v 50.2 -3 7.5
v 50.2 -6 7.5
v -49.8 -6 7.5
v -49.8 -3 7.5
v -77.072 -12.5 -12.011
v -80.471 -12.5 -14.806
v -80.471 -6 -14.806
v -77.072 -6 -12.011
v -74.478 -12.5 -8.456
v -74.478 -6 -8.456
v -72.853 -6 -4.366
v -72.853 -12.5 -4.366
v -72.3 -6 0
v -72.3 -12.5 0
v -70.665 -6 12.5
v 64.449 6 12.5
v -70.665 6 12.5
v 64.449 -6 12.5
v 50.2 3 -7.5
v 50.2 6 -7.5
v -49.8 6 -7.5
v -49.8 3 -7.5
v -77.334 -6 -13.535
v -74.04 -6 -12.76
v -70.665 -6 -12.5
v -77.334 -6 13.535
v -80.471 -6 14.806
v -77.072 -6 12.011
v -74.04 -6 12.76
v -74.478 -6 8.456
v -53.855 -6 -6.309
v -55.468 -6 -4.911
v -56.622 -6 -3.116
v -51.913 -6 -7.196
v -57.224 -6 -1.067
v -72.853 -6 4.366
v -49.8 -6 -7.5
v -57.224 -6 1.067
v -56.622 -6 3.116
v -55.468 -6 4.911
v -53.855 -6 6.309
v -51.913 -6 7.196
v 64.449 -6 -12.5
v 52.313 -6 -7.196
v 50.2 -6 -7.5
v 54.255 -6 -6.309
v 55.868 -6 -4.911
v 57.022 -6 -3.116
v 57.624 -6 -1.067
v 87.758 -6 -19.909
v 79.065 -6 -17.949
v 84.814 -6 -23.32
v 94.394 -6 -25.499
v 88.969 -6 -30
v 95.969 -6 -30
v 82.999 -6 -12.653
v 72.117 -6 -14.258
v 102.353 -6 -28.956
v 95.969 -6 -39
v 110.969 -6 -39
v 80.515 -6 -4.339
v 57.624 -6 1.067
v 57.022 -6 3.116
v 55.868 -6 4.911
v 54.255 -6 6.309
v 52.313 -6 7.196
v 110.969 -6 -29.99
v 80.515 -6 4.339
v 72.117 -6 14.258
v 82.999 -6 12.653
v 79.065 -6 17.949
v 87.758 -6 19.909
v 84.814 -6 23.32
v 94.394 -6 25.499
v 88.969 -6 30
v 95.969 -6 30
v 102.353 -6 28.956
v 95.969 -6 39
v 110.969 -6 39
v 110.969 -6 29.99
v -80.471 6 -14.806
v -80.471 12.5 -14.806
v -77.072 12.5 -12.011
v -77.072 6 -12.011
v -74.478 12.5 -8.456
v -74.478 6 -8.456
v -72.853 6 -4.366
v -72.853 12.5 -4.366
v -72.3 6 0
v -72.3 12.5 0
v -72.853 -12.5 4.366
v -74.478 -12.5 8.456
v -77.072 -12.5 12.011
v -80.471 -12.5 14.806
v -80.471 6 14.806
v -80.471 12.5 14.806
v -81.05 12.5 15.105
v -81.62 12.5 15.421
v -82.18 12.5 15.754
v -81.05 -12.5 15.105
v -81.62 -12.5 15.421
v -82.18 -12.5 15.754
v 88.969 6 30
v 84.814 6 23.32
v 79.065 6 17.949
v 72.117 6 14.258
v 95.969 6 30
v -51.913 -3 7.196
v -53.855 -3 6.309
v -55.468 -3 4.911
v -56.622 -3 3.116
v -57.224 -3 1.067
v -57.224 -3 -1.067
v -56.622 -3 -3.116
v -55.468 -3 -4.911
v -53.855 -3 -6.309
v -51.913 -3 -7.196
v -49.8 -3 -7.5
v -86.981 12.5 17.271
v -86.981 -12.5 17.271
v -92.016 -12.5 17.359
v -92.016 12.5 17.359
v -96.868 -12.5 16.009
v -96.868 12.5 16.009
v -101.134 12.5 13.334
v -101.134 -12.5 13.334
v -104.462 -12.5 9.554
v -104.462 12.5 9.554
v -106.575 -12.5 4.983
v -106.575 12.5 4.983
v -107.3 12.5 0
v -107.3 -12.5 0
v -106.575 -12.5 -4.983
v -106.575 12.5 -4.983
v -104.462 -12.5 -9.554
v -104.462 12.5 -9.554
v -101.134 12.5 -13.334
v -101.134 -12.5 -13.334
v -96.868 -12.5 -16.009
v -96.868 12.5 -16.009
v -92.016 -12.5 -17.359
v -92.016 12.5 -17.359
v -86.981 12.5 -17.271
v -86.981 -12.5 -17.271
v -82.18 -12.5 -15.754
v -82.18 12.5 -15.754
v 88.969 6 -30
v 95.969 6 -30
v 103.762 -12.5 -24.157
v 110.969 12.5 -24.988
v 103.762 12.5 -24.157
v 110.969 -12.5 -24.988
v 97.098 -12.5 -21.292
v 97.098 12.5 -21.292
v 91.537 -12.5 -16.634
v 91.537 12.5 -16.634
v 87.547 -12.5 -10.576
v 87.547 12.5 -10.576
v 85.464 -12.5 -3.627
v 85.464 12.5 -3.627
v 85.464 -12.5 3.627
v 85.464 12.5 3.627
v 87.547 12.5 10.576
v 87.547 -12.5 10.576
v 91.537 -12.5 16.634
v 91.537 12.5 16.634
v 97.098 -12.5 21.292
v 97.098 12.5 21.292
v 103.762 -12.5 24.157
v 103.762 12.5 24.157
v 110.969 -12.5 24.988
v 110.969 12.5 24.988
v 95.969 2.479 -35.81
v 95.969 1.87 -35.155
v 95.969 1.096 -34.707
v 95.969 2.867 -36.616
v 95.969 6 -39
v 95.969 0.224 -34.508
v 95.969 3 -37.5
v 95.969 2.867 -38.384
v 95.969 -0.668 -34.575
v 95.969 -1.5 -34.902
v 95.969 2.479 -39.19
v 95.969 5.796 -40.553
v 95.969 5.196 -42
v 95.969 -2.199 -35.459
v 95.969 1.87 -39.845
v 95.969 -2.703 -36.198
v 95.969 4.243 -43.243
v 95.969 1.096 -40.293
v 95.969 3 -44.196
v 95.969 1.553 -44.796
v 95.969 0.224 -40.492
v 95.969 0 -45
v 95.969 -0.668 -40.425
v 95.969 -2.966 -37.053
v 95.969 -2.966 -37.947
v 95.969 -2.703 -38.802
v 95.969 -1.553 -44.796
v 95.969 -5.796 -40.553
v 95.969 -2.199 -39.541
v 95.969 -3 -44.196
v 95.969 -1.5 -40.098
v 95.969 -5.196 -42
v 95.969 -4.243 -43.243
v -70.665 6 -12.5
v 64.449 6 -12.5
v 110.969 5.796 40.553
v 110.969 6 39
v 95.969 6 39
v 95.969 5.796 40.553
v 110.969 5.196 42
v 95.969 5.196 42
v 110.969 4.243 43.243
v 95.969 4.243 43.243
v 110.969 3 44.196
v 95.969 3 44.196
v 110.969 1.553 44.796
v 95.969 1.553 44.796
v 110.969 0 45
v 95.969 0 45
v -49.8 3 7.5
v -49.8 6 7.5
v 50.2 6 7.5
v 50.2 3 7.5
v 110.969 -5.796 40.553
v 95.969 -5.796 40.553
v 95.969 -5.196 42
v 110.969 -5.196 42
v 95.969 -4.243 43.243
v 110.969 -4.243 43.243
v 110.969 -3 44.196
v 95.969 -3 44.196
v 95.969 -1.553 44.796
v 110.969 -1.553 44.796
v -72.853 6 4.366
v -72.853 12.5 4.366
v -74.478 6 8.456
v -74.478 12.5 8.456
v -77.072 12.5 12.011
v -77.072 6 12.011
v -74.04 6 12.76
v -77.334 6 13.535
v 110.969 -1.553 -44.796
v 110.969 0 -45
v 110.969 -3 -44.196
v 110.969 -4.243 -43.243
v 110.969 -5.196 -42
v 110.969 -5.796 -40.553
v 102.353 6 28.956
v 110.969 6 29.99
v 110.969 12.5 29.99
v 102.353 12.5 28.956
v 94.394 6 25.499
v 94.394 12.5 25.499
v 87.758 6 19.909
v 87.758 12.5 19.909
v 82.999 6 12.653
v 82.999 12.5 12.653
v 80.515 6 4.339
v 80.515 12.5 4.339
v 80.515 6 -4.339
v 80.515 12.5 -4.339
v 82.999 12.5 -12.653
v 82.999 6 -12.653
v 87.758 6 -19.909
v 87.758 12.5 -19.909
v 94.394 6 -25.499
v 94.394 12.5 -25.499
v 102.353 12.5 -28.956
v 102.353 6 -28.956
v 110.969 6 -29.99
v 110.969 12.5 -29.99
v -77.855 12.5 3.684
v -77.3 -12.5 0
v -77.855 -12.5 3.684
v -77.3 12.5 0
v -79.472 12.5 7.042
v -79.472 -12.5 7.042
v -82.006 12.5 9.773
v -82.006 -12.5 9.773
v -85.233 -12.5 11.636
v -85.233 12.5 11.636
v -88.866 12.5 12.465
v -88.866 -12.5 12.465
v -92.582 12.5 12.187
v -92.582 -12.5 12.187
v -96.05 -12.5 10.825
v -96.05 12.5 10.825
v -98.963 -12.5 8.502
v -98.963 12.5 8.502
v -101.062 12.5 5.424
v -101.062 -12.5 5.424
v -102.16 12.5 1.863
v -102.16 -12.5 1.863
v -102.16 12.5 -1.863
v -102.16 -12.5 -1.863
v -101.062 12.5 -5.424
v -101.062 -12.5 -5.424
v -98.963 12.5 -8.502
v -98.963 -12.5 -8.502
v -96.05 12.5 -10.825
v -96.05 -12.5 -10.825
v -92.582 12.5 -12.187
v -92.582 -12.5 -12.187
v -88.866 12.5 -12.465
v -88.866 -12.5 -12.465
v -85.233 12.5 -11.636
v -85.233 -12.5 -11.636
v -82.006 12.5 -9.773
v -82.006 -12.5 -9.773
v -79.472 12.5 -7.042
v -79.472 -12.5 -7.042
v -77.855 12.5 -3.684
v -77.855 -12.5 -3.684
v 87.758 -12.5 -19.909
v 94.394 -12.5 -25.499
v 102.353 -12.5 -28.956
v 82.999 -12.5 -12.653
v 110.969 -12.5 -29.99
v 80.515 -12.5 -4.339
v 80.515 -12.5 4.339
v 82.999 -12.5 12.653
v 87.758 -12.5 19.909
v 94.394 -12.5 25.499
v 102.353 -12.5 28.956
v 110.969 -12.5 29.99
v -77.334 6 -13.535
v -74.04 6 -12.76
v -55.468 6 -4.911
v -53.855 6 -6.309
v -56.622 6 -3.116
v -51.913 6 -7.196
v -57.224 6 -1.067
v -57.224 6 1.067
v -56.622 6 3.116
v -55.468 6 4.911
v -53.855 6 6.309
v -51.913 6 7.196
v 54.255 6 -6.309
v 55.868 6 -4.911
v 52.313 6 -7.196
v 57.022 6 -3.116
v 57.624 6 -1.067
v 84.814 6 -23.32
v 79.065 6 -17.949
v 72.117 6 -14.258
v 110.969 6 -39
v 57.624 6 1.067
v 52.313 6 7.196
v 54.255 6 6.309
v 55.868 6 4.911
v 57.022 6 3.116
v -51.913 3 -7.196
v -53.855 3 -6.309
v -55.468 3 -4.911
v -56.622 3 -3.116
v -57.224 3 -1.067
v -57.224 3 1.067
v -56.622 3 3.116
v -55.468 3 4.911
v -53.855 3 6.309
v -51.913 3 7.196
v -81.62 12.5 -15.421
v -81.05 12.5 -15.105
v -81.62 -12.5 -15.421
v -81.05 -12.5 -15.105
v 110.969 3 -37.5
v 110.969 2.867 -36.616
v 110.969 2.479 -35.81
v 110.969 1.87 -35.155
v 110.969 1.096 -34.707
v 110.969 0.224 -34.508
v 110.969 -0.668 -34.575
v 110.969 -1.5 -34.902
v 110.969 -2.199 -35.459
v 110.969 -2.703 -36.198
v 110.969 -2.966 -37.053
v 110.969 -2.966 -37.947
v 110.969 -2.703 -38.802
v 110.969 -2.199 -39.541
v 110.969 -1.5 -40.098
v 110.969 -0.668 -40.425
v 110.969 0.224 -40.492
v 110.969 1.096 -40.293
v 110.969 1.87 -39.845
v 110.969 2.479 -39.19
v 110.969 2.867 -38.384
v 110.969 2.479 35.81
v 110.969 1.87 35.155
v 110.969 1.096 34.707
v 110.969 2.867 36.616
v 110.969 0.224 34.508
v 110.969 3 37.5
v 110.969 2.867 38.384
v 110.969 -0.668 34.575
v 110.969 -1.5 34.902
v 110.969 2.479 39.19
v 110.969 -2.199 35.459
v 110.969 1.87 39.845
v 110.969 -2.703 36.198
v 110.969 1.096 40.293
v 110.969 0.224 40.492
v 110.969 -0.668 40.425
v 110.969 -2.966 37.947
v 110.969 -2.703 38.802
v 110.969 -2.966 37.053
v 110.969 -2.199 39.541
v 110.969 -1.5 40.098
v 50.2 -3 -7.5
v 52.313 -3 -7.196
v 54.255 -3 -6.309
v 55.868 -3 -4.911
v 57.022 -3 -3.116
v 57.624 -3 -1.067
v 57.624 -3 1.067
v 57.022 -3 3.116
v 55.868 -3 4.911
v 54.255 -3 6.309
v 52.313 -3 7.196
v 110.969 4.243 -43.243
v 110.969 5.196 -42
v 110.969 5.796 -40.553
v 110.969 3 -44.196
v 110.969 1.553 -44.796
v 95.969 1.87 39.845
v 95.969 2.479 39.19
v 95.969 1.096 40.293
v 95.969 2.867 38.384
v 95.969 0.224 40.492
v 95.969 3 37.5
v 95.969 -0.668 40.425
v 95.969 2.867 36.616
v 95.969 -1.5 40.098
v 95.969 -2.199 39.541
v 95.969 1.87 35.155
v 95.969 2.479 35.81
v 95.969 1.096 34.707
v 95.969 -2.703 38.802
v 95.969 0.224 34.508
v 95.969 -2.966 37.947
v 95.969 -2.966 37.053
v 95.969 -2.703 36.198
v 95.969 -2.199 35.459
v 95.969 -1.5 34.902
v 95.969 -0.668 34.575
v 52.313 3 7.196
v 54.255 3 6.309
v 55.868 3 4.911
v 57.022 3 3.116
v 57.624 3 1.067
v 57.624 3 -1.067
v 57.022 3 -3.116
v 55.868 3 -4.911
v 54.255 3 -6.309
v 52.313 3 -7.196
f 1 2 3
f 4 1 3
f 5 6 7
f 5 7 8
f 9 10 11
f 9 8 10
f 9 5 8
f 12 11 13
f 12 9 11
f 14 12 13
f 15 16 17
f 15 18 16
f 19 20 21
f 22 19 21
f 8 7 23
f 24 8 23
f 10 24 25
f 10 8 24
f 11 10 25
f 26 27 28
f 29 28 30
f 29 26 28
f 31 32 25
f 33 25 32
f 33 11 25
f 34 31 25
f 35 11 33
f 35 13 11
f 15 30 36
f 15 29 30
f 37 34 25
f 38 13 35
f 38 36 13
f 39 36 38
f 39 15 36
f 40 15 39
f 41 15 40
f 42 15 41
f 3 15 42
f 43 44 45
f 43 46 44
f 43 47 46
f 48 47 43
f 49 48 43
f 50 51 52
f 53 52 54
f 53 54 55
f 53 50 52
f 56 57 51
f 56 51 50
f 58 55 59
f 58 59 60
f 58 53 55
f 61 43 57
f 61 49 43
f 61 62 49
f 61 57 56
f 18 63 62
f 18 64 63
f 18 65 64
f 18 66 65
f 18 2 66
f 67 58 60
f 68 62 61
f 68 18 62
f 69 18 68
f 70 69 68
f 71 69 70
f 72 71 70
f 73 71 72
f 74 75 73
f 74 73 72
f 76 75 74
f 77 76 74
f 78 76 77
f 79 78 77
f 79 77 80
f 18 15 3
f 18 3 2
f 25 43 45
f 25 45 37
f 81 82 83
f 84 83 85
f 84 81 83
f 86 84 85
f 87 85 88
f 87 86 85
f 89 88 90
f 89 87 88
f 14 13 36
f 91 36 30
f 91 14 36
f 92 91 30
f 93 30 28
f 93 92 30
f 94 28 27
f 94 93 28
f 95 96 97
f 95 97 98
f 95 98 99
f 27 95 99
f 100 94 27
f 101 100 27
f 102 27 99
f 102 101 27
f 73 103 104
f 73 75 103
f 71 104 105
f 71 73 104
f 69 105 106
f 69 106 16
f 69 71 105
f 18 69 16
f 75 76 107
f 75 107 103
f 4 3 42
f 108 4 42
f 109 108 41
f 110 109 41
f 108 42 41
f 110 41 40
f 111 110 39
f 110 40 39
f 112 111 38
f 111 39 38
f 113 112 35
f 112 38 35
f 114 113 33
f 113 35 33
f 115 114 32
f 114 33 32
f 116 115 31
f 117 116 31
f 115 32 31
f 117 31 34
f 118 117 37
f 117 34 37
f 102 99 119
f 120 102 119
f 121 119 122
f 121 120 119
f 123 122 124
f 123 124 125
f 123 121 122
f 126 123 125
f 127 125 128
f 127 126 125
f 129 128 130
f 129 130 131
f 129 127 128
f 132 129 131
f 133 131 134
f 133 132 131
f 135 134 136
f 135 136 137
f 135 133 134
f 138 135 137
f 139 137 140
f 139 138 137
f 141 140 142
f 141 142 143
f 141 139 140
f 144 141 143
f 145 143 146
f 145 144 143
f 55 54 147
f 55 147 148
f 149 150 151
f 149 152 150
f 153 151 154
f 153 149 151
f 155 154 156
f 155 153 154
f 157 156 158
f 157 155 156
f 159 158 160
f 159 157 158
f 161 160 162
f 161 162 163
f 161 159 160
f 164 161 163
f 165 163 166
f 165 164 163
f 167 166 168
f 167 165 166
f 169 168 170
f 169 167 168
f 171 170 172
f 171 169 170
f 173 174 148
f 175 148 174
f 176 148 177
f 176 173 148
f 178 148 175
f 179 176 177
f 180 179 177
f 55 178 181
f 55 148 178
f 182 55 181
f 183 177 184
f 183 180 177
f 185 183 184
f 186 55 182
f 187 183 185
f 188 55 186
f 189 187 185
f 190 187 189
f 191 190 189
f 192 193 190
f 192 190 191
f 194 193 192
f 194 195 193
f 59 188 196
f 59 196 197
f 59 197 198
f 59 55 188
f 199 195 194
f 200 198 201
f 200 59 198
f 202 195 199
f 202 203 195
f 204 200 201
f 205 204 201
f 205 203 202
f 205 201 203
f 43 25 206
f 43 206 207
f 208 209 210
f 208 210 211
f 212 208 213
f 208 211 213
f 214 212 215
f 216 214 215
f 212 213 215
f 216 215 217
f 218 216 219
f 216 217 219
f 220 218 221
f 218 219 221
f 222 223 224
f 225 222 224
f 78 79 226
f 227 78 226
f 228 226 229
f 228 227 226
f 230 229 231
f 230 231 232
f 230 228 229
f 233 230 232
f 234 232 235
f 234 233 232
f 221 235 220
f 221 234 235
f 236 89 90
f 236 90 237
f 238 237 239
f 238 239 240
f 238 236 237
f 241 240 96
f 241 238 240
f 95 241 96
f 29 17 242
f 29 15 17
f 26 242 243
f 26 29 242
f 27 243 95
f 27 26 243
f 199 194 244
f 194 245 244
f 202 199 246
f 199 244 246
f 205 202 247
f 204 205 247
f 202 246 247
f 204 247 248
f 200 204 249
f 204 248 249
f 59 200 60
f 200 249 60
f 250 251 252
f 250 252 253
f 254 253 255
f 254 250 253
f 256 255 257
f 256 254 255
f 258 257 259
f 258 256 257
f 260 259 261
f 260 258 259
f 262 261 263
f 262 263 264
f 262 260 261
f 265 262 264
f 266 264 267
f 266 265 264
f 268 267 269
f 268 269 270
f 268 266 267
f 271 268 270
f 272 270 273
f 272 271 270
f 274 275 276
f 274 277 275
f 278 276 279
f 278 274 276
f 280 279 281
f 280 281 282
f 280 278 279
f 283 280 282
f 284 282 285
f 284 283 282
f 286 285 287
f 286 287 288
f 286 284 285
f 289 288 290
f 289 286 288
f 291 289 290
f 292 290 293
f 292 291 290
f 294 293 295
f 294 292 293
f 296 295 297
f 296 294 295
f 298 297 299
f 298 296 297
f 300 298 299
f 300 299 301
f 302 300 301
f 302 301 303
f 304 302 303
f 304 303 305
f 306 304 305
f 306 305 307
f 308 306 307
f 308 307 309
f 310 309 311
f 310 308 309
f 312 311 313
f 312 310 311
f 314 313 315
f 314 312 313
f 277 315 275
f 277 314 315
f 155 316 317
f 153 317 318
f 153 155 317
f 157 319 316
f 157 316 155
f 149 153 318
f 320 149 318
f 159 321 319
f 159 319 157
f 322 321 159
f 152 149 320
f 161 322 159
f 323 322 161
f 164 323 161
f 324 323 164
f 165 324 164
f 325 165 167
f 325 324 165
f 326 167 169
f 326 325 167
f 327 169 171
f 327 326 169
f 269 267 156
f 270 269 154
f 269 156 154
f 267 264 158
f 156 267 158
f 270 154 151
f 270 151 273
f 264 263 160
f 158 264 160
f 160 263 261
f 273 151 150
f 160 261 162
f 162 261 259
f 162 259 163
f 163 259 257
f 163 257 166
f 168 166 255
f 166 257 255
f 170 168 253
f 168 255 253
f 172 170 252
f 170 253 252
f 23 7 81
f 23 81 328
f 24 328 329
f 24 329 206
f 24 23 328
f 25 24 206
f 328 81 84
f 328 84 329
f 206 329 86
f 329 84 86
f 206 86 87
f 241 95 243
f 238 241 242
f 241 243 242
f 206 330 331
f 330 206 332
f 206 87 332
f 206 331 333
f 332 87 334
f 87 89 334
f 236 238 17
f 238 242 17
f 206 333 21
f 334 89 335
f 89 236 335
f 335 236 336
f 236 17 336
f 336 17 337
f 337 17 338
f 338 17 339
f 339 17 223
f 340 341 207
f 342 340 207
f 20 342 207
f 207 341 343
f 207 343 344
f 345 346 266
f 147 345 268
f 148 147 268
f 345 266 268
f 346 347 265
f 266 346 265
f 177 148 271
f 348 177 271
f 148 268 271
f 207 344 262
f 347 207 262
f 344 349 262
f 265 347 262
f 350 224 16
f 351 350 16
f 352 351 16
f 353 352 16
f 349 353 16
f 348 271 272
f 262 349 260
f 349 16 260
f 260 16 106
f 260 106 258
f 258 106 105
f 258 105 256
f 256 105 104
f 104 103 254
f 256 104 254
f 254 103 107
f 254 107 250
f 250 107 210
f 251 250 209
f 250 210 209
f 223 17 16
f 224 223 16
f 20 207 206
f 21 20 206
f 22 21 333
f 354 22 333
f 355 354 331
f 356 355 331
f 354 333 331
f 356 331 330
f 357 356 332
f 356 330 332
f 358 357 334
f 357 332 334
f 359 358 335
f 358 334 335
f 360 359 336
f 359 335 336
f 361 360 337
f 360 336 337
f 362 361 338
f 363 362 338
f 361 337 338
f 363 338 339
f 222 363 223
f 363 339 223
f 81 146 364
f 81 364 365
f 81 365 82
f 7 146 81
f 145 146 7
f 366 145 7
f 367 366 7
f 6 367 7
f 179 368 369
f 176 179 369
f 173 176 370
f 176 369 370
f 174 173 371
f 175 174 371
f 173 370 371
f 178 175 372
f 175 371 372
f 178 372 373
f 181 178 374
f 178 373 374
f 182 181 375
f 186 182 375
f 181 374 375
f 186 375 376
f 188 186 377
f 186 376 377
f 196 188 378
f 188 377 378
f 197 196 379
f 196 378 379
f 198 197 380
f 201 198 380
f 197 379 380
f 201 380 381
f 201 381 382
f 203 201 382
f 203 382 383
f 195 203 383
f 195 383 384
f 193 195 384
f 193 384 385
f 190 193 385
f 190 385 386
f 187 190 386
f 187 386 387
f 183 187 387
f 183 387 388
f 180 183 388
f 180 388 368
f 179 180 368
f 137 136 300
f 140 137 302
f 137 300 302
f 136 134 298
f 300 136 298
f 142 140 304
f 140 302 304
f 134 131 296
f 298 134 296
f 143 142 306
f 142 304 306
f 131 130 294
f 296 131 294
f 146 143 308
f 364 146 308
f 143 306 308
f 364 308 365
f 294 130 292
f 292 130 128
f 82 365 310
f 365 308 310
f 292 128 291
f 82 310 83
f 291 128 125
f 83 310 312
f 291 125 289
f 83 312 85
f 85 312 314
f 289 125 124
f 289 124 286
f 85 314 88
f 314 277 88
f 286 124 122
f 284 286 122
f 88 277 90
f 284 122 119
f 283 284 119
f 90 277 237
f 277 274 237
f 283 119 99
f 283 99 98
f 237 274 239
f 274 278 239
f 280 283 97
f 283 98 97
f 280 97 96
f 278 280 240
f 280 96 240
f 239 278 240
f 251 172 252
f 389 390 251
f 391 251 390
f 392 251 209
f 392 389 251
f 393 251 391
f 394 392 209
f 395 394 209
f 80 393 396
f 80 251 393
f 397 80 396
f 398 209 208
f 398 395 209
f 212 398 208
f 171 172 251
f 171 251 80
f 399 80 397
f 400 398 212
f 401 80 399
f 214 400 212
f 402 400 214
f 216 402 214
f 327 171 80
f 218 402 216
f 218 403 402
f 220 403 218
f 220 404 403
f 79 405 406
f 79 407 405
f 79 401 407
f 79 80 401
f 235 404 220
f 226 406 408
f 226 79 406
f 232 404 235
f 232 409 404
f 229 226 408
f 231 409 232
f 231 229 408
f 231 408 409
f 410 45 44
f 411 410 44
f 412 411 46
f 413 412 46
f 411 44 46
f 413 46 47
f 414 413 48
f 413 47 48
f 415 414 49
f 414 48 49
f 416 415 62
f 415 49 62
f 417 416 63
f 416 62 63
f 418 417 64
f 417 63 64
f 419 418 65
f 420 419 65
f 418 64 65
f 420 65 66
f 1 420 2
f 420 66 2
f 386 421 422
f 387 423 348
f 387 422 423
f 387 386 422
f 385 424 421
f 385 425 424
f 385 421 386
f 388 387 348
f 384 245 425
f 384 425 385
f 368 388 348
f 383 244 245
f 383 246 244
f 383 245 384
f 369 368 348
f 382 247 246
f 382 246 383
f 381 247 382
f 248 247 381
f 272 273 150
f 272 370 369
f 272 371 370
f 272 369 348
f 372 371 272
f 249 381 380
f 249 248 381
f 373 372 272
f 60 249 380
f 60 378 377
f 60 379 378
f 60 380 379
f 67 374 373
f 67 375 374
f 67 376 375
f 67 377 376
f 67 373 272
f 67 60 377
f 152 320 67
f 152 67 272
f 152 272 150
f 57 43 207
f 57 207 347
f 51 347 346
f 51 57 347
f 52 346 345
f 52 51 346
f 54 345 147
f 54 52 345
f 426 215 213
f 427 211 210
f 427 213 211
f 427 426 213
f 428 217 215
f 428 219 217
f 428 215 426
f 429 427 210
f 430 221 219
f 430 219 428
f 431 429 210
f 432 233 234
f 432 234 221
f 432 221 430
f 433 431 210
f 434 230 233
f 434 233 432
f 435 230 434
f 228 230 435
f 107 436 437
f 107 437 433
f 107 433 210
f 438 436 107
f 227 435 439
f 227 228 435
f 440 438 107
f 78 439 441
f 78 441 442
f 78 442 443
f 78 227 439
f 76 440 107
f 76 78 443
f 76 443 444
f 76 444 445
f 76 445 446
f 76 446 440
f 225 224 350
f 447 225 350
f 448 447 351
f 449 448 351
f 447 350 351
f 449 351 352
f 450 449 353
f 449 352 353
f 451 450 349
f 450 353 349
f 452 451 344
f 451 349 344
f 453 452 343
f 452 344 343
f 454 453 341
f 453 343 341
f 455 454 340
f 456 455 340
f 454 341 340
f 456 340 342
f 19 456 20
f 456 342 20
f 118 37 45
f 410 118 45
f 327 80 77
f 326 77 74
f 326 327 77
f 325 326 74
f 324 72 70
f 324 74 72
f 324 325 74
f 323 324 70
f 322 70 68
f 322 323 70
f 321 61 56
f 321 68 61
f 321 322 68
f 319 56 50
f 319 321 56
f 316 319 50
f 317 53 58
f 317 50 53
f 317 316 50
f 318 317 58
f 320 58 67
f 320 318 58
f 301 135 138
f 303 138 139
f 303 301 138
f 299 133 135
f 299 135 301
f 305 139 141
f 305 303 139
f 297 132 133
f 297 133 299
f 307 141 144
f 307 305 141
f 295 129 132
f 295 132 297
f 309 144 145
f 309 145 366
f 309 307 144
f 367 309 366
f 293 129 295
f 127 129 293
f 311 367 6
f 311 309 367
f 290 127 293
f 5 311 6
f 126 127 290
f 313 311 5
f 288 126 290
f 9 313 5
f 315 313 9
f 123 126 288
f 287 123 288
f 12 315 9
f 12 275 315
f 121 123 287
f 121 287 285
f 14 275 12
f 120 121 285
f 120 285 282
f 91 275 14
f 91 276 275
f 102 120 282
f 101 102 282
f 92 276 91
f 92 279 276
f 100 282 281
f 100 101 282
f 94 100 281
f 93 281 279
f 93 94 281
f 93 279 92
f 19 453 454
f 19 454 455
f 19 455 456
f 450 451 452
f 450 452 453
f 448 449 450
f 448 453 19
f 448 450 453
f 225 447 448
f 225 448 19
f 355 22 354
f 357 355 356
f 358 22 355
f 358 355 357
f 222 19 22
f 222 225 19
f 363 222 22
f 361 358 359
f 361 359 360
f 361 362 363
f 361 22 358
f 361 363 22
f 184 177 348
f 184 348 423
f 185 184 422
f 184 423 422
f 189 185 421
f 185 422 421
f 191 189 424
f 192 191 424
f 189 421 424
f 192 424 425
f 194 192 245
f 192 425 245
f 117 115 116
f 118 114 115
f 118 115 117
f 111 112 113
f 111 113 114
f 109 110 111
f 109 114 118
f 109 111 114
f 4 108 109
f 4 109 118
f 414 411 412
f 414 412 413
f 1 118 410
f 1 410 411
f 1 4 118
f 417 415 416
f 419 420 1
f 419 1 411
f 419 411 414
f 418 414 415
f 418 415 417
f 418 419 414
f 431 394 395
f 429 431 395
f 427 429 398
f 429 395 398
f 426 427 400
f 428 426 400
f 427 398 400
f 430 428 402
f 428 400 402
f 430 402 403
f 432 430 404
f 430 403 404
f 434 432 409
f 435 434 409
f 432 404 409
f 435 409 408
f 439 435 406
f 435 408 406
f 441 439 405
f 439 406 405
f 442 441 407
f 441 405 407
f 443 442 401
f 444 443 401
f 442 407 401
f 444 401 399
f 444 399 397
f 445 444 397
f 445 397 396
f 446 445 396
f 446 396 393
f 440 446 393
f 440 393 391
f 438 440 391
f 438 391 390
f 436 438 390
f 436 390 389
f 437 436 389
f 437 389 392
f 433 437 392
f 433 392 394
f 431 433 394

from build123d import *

# Parameters (mm, degrees)
F1_DEPTH  = 12.5
F0_R      = 12.5
F2_DEPTH  = 6
F3_R      = 5.99999
F4_R      = 5.99999
F6_DEPTH  = 3
F8_DEPTH  = 3
F9_R      = 3
F10_DEPTH = 218.2697359261


# Not quite as in the source:
# - a fillet or chamfer is up to 0.001 mm smaller than in the source, because OpenCascade refuses the exact size


with BuildPart() as f1:
    # F0 (on Front) → F1 (new body, symmetric)
    with BuildSketch(Plane.XZ):
        with BuildLine():
            Line((110.9687169417, 24.9881781063), (110.9687169417, 29.9901491338))
            ThreePointArc((110.9687169417, 29.9901491338), (80.1999810155, 2.02996e-05), (110.9686763555, -29.9901501743))
            Line((110.9686763555, -29.9901501743), (110.9686763555, -24.988179355))
            ThreePointArc((110.9686763555, -24.988179355), (85.1999810155, 2.03026e-05), (110.9687169417, 24.9881781063))
        make_face()
    extrude(amount=F1_DEPTH, both=True)



with BuildPart() as f1b:
    # F0 (on Front) → F1, piece 2 (new body, symmetric)
    with BuildSketch(Plane.XZ):
        with BuildLine():
            ThreePointArc((-80.4711318513, 14.8061428082), (-81.3358966232, 15.2609531347), (-82.1796143085, 15.7537117078))
            ThreePointArc((-82.1796143085, 15.7537117078), (-107.3000189845, 0), (-82.1796143085, -15.7537117078))
            ThreePointArc((-82.1796143085, -15.7537117078), (-81.3358966232, -15.2609531347), (-80.4711318513, -14.8061428082))
            ThreePointArc((-80.4711318513, -14.8061428082), (-74.4783753907, -8.455603916), (-72.3000189845, 0))
            ThreePointArc((-72.3000189845, 0), (-74.4783753907, 8.455603916), (-80.4711318513, 14.8061428082))
        make_face()
        with Locations((-89.8000189845, 0)):
            Circle(F0_R, mode=Mode.SUBTRACT)
    extrude(amount=F1_DEPTH, both=True)


with BuildPart() as f1_1:
    add(f1.part)

    add(f1b.part)  # F2 merges F1b
    # F0 (on Front) → F2 (join, symmetric)
    with BuildSketch(Plane.XZ):
        with BuildLine():
            ThreePointArc((-70.6654197961, 12.5), (-75.702042761, 13.0842948024), (-80.4711318513, 14.8061428082))
            ThreePointArc((-80.4711318513, 14.8061428082), (-74.4783753907, 8.455603916), (-72.3000189845, 0))
            ThreePointArc((-72.3000189845, 0), (-74.4783753907, -8.455603916), (-80.4711318513, -14.8061428082))
            ThreePointArc((-80.4711318513, -14.8061428082), (-75.702042761, -13.0842948024), (-70.6654197961, -12.5))
            Line((-70.6654197961, -12.5), (64.4492452955, -12.5))
            ThreePointArc((64.4492452955, -12.5), (79.0647132666, -17.9493308815), (88.9686763555, -30))
            Line((88.9686763555, -30), (95.9686763555, -30))
            Line((95.9686763555, -30), (95.9686763555, -45))
            Line((95.9686763555, -45), (110.9686763555, -45))
            Line((110.9686763555, -45), (110.9686763555, -29.9901501743))
            ThreePointArc((110.9686763555, -29.9901501743), (80.1999810155, 2.02996e-05), (110.9687169417, 29.9901491338))
            Line((110.9687169417, 29.9901491338), (110.9687169417, 45))
            Line((110.9687169417, 45), (95.9687169417, 44.9999957531))
            Line((95.9687169417, 44.9999957531), (95.9687169417, 29.9999957531))
            Line((95.9687169417, 29.9999957531), (88.9687169417, 29.9999957531))
            ThreePointArc((88.9687169417, 29.9999957531), (79.0647357521, 17.9493194217), (64.4492452955, 12.5))
            Line((64.4492452955, 12.5), (-70.6654197961, 12.5))
        make_face()
    extrude(amount=F2_DEPTH, both=True)

    # F3 (radius 6 in the source; OpenCascade refuses exactly that, so slightly less here)
    f3_edges = [f1_1.edges().sort_by_distance(p)[0] for p in [
        (103.468717, -6, 44.999998),
        (103.468717, 6, 44.999998),
    ]]
    fillet(f3_edges, radius=F3_R)

    # F4 (radius 6 in the source; OpenCascade refuses exactly that, so slightly less here)
    f4_edges = [f1_1.edges().sort_by_distance(p)[0] for p in [
        (103.468676, -6, -45),
        (103.468676, 6, -45),
    ]]
    fillet(f4_edges, radius=F4_R)

    # F5 (on face) → F6 (cut)
    with BuildSketch(Plane.XZ.offset(6)):
        with BuildLine():
            Line((50.1999810155, 7.5), (-49.8000189845, 7.5))
            ThreePointArc((-49.8000189845, 7.5), (-57.3000189845, 0), (-49.8000189845, -7.5))
            Line((-49.8000189845, -7.5), (50.1999810155, -7.5))
            ThreePointArc((50.1999810155, -7.5), (57.6999810155, 0), (50.1999810155, 7.5))
        make_face()
    extrude(amount=-F6_DEPTH, mode=Mode.SUBTRACT)

    # F7 (on face) → F8 (cut)
    with BuildSketch(Plane(origin=(0, 6, 0), x_dir=(-1, 0, 0), z_dir=(0, 1, 0))):
        with BuildLine():
            Line((49.8000189845, 7.5), (-50.1999810155, 7.5))
            ThreePointArc((-50.1999810155, 7.5), (-57.6999810155, 0), (-50.1999810155, -7.5))
            Line((-50.1999810155, -7.5), (49.8000189845, -7.5))
            ThreePointArc((49.8000189845, -7.5), (57.3000189845, 0), (49.8000189845, 7.5))
        make_face()
    extrude(amount=-F8_DEPTH, mode=Mode.SUBTRACT)

    # F9 (on face) → F10 (cut, through all)
    with BuildSketch(Plane.YZ.offset(110.9687169417)):
        with Locations((0, 37.5)):
            Circle(F9_R)
        with Locations((0, -37.5)):
            Circle(F9_R)
    extrude(amount=-F10_DEPTH, mode=Mode.SUBTRACT)


solid = f1_1.part
